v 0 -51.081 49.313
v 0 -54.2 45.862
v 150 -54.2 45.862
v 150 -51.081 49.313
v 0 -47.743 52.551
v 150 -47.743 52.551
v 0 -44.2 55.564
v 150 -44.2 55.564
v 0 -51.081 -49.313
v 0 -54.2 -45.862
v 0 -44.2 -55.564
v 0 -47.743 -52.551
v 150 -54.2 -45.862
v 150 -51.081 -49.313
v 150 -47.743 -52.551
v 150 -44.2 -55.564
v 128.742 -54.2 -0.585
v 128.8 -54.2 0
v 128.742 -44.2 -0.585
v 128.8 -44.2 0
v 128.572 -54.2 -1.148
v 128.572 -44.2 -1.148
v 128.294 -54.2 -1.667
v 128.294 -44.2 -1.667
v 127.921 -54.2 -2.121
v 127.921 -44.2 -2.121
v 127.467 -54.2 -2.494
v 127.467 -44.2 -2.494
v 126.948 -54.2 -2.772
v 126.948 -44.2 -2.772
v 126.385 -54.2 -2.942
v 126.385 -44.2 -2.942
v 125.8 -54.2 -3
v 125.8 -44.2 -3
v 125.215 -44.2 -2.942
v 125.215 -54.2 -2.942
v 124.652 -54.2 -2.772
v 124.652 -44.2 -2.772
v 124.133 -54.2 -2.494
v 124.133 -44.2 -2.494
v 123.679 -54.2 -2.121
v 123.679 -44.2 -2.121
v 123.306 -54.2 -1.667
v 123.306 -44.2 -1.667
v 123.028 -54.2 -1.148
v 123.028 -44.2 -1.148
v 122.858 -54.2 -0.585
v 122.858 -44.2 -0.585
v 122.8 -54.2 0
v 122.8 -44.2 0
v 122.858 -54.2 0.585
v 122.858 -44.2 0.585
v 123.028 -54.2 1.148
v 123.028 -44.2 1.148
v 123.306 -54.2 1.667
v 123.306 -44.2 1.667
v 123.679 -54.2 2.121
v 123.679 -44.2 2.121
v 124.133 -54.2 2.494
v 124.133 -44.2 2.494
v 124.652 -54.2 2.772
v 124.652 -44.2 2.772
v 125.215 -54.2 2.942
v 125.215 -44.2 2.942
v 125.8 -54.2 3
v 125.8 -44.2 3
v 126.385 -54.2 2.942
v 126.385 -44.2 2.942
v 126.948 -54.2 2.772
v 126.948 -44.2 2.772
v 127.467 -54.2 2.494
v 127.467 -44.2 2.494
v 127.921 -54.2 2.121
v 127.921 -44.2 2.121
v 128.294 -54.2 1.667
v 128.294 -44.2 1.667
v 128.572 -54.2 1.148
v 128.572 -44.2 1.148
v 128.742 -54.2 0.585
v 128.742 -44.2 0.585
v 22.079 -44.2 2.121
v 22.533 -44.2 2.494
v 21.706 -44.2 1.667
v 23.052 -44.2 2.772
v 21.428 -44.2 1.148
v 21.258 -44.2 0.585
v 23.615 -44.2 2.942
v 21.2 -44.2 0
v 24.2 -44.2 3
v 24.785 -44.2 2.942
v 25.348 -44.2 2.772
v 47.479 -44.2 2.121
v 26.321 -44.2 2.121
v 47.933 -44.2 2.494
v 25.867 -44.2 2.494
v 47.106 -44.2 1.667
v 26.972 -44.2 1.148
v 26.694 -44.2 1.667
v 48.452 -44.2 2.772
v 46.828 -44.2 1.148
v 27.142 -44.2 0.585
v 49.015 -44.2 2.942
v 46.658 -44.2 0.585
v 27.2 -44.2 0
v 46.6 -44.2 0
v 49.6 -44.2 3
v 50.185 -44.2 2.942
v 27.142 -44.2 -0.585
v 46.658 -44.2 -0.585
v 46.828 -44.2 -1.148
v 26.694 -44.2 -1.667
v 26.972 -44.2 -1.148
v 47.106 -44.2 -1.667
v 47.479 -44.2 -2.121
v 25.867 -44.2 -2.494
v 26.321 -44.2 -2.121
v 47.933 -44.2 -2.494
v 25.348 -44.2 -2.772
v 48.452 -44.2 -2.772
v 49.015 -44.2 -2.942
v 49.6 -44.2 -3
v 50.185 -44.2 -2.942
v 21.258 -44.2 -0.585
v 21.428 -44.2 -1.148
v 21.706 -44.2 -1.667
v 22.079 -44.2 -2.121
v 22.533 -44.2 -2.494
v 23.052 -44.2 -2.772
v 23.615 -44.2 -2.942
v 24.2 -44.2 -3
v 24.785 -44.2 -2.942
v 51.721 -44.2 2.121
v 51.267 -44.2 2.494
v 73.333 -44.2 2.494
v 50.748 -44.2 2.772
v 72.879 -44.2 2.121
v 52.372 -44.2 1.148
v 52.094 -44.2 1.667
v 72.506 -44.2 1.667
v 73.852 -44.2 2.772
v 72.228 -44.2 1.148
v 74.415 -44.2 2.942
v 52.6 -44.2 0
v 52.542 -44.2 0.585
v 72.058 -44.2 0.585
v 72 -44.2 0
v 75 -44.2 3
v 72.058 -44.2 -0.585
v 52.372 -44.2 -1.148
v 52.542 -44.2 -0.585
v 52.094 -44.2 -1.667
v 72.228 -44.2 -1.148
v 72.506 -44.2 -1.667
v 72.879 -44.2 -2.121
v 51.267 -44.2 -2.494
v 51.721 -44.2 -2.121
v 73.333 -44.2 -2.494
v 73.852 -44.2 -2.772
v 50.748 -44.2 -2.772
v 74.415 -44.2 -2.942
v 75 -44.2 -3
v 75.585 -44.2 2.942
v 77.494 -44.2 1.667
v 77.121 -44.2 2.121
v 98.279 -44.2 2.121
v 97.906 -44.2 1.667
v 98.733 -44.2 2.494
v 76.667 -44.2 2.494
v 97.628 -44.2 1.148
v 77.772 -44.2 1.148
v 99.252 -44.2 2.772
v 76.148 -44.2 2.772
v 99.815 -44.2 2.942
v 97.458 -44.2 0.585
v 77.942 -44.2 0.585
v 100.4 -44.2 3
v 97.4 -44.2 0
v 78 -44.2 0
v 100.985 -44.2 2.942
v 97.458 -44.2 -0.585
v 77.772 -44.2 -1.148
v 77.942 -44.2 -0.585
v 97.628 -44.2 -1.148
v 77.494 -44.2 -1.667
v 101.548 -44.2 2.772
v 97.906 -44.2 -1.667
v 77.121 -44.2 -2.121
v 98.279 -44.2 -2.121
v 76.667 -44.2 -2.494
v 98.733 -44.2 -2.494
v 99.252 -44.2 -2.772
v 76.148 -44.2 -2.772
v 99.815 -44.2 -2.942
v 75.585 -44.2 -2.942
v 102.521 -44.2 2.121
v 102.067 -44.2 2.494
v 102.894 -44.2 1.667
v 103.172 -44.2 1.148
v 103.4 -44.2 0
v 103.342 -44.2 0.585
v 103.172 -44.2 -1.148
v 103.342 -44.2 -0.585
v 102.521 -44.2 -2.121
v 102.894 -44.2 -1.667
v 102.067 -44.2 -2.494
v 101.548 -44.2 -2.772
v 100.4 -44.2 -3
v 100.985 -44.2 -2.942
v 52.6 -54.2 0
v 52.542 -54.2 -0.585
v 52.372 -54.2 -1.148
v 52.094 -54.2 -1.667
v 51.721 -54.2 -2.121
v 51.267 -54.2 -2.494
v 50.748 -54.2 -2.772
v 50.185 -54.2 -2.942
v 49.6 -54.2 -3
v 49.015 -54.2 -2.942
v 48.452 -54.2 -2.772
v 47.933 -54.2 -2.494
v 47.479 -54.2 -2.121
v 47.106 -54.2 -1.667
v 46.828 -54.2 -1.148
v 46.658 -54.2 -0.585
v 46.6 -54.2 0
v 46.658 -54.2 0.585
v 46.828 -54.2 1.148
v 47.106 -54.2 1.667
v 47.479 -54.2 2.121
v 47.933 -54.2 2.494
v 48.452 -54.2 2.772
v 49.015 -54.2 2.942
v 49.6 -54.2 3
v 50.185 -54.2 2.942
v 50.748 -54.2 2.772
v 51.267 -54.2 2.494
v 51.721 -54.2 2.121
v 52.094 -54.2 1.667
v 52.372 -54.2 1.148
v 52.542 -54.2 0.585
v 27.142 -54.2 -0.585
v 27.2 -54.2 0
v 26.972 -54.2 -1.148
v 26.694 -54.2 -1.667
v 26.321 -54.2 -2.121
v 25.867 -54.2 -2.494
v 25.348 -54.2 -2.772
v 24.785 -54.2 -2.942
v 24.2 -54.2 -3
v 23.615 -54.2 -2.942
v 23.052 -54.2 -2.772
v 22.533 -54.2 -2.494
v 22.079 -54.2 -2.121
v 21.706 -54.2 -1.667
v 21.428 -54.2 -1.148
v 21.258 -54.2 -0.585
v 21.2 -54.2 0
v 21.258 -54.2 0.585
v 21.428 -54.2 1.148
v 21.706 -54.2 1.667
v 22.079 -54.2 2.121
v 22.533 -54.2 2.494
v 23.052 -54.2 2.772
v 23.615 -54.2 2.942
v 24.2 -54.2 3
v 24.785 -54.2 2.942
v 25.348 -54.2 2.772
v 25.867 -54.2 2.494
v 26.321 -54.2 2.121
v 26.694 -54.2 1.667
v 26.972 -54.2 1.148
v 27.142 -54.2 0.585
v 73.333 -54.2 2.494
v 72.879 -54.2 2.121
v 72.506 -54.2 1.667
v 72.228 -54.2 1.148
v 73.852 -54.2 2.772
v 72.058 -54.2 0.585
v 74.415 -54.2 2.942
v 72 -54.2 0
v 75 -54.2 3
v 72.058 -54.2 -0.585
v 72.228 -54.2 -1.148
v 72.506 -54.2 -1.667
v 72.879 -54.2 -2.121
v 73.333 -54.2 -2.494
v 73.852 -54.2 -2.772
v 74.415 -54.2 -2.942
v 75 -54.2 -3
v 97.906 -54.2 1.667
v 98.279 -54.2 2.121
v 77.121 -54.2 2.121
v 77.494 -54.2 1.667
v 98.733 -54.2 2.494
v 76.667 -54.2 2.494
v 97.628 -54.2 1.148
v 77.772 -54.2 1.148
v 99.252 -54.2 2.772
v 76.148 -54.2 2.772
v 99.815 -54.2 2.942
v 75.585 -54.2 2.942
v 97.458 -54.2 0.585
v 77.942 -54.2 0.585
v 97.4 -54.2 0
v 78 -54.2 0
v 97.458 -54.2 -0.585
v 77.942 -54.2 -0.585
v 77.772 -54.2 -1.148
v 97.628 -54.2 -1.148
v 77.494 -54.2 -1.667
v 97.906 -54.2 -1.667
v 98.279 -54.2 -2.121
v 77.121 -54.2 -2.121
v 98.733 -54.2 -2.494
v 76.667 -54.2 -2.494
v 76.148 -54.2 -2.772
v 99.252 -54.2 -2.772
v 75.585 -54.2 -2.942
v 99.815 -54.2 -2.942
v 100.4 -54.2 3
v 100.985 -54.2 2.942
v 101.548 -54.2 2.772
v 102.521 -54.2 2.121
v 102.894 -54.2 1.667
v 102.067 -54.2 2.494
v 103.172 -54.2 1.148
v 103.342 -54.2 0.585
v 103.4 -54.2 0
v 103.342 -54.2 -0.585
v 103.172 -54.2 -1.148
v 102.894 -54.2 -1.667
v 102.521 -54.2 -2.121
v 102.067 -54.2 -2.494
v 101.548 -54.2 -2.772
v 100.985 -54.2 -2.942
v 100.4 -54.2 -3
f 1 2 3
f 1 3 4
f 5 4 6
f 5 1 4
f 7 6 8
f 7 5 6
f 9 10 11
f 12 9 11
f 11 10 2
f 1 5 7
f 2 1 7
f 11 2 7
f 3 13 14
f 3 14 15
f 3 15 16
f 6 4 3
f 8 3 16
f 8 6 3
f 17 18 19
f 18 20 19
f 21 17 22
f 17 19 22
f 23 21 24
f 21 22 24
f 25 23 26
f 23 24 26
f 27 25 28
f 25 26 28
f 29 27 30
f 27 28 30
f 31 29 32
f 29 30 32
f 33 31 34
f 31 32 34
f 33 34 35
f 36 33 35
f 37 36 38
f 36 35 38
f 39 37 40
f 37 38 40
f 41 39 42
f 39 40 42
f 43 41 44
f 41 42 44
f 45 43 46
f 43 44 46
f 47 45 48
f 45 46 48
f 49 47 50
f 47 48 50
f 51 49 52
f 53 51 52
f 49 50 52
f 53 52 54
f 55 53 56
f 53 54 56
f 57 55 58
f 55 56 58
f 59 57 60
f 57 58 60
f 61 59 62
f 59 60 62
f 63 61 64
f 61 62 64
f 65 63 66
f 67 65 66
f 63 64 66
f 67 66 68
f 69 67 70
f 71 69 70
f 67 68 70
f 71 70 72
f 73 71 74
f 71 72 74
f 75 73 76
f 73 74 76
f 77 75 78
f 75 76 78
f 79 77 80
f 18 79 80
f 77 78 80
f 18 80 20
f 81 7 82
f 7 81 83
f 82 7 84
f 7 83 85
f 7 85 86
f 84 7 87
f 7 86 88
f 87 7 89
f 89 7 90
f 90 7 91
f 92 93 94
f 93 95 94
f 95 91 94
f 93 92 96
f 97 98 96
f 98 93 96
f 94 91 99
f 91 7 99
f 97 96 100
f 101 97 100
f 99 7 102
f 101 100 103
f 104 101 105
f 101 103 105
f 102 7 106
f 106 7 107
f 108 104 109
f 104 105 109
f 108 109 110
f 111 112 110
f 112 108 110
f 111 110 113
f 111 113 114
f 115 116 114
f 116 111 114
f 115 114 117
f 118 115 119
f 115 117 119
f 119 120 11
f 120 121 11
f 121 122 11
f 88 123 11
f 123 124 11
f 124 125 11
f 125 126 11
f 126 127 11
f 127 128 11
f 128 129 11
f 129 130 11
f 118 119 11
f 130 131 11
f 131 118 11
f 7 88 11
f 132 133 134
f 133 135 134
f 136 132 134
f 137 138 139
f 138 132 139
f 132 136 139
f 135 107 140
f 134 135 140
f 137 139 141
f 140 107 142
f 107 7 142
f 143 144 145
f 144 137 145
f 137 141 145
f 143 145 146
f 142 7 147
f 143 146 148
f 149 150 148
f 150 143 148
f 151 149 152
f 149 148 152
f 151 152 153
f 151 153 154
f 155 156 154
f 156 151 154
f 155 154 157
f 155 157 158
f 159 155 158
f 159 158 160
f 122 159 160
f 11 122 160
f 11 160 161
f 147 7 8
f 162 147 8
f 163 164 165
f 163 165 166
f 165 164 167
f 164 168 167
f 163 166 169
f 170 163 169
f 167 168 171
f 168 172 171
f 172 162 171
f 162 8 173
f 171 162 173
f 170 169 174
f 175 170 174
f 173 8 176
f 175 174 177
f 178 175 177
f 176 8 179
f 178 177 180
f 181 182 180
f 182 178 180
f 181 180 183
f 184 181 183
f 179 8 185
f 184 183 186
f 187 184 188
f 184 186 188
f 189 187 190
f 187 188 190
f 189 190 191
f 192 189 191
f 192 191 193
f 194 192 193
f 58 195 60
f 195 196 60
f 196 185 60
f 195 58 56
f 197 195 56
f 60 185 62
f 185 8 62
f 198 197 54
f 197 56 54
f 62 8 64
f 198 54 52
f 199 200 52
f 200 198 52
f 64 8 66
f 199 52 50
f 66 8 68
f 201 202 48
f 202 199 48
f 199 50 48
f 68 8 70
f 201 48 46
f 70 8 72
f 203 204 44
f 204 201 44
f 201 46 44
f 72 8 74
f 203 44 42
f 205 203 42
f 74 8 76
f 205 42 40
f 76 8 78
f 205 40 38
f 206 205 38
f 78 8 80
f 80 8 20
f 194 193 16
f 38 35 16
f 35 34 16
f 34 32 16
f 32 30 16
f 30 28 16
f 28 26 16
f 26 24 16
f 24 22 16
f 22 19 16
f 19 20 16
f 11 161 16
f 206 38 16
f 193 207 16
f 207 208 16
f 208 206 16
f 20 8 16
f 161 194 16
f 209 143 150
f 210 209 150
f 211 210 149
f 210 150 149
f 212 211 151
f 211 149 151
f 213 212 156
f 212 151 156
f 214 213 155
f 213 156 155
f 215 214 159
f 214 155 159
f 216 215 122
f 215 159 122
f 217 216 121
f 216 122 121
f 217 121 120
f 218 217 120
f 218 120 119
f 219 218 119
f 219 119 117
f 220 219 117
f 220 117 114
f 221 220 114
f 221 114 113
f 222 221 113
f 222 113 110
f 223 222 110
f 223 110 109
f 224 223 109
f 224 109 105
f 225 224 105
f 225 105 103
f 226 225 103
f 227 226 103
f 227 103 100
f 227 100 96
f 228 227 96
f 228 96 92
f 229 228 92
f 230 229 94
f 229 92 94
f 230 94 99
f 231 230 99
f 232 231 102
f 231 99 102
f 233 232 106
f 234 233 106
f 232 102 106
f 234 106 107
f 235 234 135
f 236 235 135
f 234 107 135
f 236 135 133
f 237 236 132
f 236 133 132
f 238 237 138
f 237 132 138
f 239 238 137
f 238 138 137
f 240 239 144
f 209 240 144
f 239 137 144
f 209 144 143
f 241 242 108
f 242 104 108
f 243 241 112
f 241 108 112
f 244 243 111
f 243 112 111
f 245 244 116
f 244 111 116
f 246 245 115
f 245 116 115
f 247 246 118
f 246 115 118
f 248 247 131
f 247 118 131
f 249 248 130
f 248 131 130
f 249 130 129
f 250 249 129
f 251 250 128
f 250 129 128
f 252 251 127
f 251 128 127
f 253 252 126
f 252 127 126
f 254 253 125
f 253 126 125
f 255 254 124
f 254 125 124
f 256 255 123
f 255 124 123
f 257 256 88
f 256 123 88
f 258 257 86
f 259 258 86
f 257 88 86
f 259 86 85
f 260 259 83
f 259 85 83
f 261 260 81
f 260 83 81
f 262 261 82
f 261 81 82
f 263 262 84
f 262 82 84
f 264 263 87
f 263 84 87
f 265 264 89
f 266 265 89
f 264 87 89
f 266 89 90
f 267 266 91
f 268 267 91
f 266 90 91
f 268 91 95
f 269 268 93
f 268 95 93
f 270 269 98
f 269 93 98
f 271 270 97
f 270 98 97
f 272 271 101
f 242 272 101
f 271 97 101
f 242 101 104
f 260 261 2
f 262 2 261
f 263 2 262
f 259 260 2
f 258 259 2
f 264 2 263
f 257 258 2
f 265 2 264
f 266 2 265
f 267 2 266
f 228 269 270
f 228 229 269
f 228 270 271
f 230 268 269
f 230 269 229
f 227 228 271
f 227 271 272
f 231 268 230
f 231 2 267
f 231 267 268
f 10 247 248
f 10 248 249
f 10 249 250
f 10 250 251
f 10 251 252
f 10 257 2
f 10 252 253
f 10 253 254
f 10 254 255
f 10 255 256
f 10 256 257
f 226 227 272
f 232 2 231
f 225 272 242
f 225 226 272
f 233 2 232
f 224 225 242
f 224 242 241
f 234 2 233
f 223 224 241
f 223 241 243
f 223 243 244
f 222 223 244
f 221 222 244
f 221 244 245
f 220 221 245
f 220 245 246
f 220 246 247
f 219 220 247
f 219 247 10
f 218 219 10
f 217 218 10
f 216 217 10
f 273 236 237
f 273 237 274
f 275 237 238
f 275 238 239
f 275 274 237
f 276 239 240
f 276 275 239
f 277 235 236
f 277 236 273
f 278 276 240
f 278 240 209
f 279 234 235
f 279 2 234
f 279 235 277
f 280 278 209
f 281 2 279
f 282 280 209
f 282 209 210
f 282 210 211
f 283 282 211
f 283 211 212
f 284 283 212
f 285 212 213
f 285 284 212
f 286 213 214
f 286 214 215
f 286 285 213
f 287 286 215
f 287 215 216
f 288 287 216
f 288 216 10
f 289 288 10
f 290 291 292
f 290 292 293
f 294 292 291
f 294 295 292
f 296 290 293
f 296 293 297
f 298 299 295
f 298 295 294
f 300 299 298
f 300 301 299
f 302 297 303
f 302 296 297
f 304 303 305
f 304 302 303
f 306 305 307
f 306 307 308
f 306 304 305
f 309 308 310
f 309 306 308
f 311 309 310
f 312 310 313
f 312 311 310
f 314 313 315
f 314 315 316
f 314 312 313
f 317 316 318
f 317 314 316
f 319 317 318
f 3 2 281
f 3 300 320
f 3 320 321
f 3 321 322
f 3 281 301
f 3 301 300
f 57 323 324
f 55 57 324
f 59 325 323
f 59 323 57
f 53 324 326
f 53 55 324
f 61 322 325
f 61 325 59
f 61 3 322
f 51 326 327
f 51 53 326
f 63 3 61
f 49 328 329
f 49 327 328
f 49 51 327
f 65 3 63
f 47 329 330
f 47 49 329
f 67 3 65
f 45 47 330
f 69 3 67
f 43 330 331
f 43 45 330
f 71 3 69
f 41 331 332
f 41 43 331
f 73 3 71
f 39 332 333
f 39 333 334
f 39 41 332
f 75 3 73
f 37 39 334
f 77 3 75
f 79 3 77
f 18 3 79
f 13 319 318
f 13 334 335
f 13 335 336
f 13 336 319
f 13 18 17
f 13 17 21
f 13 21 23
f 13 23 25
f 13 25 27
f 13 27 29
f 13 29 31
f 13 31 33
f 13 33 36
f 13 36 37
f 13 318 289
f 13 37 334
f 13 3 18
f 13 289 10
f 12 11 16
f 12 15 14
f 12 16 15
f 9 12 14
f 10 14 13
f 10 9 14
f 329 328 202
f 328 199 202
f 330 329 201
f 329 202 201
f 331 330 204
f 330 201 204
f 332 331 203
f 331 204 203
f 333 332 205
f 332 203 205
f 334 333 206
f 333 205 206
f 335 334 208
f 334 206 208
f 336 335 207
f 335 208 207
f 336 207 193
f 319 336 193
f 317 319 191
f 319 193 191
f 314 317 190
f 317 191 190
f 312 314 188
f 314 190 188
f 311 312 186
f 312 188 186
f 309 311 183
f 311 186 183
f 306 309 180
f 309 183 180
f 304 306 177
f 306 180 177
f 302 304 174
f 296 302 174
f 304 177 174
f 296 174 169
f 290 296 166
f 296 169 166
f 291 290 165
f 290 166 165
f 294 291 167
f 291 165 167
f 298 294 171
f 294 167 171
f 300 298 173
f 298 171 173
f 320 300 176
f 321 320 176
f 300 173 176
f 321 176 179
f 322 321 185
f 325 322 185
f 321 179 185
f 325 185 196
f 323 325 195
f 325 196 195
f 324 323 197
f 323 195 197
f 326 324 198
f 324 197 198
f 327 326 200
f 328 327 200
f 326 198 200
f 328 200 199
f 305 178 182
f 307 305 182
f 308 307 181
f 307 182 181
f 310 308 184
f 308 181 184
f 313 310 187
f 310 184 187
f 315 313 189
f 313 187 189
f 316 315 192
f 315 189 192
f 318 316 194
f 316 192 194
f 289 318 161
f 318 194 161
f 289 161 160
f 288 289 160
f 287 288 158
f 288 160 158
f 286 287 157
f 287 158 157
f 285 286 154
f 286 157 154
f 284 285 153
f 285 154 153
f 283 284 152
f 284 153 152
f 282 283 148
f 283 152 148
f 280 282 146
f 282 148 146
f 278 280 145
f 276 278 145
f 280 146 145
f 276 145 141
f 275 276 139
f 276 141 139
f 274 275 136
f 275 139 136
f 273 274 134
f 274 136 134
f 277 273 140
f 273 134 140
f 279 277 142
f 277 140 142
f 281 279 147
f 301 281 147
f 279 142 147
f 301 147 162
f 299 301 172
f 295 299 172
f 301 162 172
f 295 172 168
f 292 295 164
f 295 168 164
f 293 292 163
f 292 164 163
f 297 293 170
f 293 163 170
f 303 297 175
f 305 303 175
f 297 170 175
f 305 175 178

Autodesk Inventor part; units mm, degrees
ref_plane "YZ Plane" through (0, 0, 0) normal (1, 0, 0) x (0, 1, 0)
ref_plane "XZ Plane" through (0, 0, 0) normal (0, 1, 0) x (-1, 0, 0)
ref_plane "XY Plane" through (0, 0, 0) normal (0, 0, 1) x (1, 0, 0)
sketch "Sketch1" plane through (0, 0, 0) normal (1, 0, 0) x (0, 1, 0)
  circle A0 centre (0, 0) radius 71
  dimension "d0" = 142
extrude "Extrusion1" add sketch "Sketch1" along normal blind 150
sketch "Sketch2" plane through (150, 0, 0) normal (1, 0, 0) x (0, 0, -1)
  line L0 (0, 0) -> (0, -44.2)
  circle A0 centre (0, 0) radius 71 projected
  line L1 (-55.564, -44.2) -> (55.564, -44.2)
  dimension "d3" = 44.2
extrude "Extrusion2" cut sketch "Sketch2" against normal blind 150 contours A0 L1 picked at (-0.2063, 32.437)
sketch "Sketch3" plane through (150, 0, 0) normal (1, 0, 0) x (0, 0, -1)
  line L0 (0, 0) -> (0, -54.2)
  arc A0 (-55.564, -44.2) -> (55.564, -44.2) centre (0, 0) ccw projected
  line L1 (-45.8624, -54.2) -> (45.8624, -54.2)
  dimension "d6" = 54.2
extrude "Extrusion3" cut sketch "Sketch3" against normal blind 150
sketch "Sketch6" plane through (150, -44.2, 55.564) normal (0, 1, 0) x (1, 0, 0)
  line L0 (-150, 55.564) -> (-75, 55.564)
  circle A0 centre (-75, 55.564) radius 3
  line L1 (-75, 55.564) -> (-49.6, 55.564)
  line L2 (-49.6, 55.564) -> (-24.2, 55.564)
  line L3 (-75, 55.564) -> (-100.4, 55.564)
  line L4 (-100.4, 55.564) -> (-125.8, 55.564)
  circle A1 centre (-100.4, 55.564) radius 3
  circle A2 centre (-125.8, 55.564) radius 3
  circle A3 centre (-24.2, 55.564) radius 3
  circle A4 centre (-49.6, 55.564) radius 3
  dimension "d51" = 75
  dimension "d52" = 6
  dimension "d53" = 25.4
  dimension "d54" = 25.4
  dimension "d55" = 25.4
  dimension "d56" = 25.4
  dimension "d57" = 6
  dimension "d58" = 6
  dimension "d59" = 6
  dimension "d60" = 6
extrude "Extrusion4" cut sketch "Sketch6" against normal blind 10
thread "Thread1" size "M6x1" class "6H" standard "ANSI Metric M Profile" full length
thread "Thread2" size "M6x1" class "6H" standard "ANSI Metric M Profile" full length
thread "Thread3" size "M6x1" class "6H" standard "ANSI Metric M Profile" full length
thread "Thread4" size "M6x1" class "6H" standard "ANSI Metric M Profile" full length
properties part number "Base"
